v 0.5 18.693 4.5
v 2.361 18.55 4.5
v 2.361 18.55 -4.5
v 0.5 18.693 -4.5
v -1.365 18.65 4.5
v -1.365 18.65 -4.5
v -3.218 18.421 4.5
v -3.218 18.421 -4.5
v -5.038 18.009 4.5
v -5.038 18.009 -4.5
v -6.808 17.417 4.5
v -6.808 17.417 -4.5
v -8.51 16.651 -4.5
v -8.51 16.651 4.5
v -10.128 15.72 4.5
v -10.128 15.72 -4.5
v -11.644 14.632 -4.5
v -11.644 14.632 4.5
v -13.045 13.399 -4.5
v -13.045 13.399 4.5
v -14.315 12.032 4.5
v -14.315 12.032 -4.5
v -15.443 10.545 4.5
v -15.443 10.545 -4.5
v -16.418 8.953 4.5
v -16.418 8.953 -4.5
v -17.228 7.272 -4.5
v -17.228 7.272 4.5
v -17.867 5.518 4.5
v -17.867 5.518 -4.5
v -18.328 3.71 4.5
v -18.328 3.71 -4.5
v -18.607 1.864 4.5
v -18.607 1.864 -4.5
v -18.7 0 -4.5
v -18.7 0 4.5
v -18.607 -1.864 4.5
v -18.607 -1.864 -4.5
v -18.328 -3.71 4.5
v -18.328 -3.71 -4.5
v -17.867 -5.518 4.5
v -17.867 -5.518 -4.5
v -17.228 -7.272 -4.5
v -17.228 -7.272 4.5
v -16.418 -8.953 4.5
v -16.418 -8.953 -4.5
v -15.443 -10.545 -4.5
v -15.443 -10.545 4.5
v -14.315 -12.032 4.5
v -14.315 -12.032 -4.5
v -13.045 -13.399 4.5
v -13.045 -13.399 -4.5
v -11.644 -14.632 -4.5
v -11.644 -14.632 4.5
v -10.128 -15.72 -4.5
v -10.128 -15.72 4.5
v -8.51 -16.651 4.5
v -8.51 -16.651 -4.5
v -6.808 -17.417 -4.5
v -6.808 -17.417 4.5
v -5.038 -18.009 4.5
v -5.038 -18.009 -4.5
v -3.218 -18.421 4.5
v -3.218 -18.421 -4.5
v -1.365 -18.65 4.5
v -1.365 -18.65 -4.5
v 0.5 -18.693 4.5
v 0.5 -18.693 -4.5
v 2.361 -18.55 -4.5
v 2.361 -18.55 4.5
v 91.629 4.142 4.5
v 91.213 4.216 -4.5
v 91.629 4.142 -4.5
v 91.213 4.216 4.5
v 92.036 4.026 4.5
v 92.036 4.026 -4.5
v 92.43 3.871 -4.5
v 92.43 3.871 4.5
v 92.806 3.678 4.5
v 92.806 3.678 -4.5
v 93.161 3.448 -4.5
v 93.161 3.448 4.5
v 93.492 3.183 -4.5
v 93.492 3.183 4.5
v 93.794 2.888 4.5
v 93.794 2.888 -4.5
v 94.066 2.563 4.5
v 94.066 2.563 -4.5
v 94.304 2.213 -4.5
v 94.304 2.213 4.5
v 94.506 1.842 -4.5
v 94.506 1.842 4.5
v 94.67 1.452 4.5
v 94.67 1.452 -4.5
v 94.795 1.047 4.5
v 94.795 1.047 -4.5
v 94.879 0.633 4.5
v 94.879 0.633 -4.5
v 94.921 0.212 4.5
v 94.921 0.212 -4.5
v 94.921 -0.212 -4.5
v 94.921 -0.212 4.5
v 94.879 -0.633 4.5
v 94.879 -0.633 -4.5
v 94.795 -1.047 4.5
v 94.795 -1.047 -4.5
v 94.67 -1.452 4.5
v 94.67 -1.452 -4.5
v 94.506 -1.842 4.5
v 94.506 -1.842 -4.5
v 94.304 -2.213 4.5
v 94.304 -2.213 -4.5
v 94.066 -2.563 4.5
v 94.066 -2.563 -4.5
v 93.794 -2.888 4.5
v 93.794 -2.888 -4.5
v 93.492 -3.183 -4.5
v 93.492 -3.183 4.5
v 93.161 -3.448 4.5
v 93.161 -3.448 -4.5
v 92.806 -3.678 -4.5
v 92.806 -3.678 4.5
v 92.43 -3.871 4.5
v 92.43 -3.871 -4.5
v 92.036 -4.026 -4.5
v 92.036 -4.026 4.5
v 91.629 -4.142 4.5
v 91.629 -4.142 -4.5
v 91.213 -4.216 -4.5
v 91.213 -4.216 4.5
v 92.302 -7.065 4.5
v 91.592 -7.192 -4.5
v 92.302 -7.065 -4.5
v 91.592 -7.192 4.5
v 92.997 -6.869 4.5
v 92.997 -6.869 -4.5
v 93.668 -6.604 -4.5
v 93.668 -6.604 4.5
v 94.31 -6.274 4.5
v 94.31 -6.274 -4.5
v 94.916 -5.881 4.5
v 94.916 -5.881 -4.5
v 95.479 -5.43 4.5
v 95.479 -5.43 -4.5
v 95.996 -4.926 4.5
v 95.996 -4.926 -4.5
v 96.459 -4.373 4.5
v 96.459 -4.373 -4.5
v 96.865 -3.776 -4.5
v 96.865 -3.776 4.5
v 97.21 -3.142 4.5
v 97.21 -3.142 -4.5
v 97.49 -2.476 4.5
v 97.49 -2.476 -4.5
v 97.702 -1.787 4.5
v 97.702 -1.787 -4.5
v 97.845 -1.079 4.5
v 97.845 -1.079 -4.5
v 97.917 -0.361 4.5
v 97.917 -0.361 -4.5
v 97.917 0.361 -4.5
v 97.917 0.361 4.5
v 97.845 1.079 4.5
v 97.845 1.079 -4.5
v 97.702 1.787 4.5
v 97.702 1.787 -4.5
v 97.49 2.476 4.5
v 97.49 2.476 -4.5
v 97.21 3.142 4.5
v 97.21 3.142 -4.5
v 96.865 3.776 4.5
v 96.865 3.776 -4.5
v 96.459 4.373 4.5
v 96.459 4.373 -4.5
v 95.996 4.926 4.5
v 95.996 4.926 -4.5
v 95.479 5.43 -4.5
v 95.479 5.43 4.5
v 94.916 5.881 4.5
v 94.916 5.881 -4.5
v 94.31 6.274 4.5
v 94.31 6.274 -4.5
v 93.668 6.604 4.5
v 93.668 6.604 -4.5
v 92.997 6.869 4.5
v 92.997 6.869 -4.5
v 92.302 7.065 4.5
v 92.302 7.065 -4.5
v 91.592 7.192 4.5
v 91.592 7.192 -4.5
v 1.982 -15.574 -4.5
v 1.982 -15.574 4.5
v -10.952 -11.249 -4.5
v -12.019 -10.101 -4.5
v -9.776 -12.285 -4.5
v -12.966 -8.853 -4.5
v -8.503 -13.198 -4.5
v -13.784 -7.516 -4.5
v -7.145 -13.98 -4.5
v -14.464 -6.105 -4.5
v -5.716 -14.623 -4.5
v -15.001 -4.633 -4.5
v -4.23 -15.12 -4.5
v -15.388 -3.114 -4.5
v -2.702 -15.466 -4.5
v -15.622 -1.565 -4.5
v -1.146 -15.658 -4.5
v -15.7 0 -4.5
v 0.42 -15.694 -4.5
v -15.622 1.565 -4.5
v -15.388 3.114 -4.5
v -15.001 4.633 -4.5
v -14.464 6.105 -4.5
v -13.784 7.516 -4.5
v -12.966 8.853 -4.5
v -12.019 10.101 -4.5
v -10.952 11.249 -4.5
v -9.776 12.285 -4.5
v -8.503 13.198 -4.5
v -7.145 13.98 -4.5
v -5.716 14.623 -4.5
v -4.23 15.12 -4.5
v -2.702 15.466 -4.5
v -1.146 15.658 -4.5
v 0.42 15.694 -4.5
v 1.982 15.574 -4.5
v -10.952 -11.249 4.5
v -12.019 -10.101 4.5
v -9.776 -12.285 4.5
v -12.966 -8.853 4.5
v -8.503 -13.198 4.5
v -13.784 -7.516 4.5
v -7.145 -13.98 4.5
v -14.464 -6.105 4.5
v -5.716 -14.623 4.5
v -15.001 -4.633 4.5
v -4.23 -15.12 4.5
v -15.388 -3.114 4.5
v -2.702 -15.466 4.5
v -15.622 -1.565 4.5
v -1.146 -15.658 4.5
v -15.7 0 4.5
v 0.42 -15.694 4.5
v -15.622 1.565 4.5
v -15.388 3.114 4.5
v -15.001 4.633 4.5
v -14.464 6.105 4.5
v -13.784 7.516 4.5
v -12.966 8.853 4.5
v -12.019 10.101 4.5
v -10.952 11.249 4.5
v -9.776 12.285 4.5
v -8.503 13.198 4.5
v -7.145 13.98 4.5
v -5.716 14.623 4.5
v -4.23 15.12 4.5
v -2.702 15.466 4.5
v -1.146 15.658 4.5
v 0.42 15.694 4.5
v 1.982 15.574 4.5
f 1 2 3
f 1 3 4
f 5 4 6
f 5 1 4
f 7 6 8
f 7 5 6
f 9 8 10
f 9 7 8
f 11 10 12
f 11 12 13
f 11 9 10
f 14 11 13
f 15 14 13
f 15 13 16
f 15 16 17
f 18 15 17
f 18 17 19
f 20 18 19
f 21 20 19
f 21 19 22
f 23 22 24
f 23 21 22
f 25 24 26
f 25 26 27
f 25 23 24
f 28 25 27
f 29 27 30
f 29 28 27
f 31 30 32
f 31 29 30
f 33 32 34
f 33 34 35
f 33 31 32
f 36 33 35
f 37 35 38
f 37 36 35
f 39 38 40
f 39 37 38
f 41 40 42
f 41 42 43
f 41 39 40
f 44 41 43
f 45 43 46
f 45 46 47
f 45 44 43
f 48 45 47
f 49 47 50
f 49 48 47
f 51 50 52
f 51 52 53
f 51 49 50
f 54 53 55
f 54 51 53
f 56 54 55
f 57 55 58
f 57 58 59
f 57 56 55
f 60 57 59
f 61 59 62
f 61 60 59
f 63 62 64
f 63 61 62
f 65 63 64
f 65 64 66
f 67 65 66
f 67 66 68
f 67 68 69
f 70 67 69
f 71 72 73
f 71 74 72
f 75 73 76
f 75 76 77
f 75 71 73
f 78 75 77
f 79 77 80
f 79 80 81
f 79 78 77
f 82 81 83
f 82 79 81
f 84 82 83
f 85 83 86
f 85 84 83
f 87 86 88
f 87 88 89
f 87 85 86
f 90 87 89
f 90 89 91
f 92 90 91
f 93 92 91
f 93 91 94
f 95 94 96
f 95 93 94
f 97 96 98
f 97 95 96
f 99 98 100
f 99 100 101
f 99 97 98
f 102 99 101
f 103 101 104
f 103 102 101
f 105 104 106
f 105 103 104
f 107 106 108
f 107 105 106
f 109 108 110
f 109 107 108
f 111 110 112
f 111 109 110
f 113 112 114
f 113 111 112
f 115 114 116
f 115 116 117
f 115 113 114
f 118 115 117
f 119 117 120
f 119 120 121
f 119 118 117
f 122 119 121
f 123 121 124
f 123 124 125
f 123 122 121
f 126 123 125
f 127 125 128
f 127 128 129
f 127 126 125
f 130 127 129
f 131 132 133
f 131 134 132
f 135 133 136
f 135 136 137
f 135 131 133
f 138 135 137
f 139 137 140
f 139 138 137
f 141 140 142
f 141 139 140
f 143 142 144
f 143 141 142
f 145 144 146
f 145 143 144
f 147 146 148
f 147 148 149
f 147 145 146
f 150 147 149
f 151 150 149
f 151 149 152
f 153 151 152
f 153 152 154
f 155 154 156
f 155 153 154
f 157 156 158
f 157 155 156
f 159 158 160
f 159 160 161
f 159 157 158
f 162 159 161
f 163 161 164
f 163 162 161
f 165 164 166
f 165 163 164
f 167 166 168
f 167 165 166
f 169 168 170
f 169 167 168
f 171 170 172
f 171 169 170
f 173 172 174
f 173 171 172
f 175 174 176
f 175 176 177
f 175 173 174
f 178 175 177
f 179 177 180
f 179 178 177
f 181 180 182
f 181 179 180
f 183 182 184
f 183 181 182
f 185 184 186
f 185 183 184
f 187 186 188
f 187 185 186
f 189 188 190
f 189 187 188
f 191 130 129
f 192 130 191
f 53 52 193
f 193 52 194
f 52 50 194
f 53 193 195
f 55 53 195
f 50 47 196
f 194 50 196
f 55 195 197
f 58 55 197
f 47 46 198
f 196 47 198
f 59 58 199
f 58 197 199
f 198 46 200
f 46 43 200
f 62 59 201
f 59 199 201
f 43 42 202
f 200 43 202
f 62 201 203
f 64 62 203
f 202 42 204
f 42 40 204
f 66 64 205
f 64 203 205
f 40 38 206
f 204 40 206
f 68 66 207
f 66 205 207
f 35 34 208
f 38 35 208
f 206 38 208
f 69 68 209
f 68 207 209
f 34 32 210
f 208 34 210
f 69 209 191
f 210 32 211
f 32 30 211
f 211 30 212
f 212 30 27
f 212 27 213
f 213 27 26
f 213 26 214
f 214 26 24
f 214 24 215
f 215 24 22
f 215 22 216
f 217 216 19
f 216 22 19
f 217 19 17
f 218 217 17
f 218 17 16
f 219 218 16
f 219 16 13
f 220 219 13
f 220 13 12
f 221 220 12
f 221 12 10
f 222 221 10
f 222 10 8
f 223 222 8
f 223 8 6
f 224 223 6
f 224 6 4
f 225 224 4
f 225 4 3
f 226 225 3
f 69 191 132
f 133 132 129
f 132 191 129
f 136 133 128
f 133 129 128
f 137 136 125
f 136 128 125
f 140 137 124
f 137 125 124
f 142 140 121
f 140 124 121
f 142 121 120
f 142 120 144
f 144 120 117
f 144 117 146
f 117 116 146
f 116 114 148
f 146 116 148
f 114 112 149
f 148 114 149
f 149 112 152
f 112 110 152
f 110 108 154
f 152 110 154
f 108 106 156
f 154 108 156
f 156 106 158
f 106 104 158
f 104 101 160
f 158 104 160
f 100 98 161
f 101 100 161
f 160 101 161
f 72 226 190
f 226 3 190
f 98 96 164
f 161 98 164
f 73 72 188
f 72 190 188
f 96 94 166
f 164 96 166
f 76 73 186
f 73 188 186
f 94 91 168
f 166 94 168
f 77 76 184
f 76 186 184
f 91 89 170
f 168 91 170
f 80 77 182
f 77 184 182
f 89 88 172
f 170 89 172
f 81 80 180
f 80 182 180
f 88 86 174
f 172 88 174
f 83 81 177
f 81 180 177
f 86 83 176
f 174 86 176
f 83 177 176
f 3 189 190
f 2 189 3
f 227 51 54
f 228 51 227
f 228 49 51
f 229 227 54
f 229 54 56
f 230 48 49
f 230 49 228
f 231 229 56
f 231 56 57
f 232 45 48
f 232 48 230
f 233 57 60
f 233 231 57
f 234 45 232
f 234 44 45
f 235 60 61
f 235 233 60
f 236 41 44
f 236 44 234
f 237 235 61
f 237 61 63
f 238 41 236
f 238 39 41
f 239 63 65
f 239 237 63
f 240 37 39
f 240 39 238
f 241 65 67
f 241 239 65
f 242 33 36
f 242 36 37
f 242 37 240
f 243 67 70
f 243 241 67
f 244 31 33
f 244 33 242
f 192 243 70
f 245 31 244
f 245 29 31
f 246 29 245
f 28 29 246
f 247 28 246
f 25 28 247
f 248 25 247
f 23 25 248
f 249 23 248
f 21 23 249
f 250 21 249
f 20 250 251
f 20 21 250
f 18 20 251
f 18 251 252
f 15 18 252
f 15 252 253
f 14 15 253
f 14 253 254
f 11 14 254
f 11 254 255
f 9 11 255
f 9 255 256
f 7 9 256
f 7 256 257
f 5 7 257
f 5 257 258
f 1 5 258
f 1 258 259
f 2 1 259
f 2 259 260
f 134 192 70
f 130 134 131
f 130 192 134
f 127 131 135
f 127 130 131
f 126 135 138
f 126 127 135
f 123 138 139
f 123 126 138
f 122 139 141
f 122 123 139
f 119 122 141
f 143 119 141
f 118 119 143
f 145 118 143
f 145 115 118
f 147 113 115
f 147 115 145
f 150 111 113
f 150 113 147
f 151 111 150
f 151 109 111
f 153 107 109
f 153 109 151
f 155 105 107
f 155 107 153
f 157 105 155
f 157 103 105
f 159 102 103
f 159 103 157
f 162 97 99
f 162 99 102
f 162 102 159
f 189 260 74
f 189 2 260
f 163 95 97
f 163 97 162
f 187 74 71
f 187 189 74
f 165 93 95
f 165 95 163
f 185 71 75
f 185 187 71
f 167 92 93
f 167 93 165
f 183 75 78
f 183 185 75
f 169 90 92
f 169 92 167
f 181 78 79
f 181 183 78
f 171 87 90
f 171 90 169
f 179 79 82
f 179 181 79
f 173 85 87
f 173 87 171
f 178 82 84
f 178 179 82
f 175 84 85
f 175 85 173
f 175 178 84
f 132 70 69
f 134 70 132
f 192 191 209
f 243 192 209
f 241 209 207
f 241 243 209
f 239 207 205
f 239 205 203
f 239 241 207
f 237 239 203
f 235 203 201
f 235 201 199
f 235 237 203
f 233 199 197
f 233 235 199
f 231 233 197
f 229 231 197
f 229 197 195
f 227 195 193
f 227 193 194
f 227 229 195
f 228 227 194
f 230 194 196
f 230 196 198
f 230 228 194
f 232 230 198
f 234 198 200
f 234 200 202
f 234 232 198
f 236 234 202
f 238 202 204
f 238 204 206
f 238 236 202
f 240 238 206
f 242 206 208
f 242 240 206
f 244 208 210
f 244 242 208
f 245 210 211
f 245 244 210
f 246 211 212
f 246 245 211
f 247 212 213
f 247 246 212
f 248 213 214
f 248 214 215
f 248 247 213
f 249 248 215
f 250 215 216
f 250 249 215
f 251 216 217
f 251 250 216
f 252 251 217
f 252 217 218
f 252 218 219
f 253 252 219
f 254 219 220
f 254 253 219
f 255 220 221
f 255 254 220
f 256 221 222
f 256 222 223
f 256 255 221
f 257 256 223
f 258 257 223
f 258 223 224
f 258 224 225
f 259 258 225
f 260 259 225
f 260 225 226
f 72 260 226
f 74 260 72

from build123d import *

# Parameters (mm, degrees)
RESSALTO_EXTRUS_O1_DEPTH = 4.5


with BuildPart() as part:
    # Esboço1 → Ressalto-extrusão1 (new, symmetric)
    with BuildSketch(Plane.XY):
        with BuildLine():
            ThreePointArc((91.591504601, -7.191966904), (97.92602, 0), (91.591504601, 7.191966904))
            Line((91.591504601, 7.191966904), (2.361318902, 18.550314635))
            ThreePointArc((2.361318902, 18.550314635), (-18.7, 0), (2.361318902, -18.550314635))
            Line((2.361318902, -18.550314635), (91.591504601, -7.191966904))
        make_face()
        with BuildLine():
            ThreePointArc((1.982497688, -15.57432833), (-15.7, 0), (1.982497688, 15.57432833))
            Line((1.982497688, 15.57432833), (91.212683387, 4.215980599))
            ThreePointArc((91.212683387, 4.215980599), (94.92602, 0), (91.212683387, -4.215980599))
            Line((91.212683387, -4.215980599), (1.982497688, -15.57432833))
        make_face(mode=Mode.SUBTRACT)
    extrude(amount=RESSALTO_EXTRUS_O1_DEPTH, both=True)


solid = part.part
